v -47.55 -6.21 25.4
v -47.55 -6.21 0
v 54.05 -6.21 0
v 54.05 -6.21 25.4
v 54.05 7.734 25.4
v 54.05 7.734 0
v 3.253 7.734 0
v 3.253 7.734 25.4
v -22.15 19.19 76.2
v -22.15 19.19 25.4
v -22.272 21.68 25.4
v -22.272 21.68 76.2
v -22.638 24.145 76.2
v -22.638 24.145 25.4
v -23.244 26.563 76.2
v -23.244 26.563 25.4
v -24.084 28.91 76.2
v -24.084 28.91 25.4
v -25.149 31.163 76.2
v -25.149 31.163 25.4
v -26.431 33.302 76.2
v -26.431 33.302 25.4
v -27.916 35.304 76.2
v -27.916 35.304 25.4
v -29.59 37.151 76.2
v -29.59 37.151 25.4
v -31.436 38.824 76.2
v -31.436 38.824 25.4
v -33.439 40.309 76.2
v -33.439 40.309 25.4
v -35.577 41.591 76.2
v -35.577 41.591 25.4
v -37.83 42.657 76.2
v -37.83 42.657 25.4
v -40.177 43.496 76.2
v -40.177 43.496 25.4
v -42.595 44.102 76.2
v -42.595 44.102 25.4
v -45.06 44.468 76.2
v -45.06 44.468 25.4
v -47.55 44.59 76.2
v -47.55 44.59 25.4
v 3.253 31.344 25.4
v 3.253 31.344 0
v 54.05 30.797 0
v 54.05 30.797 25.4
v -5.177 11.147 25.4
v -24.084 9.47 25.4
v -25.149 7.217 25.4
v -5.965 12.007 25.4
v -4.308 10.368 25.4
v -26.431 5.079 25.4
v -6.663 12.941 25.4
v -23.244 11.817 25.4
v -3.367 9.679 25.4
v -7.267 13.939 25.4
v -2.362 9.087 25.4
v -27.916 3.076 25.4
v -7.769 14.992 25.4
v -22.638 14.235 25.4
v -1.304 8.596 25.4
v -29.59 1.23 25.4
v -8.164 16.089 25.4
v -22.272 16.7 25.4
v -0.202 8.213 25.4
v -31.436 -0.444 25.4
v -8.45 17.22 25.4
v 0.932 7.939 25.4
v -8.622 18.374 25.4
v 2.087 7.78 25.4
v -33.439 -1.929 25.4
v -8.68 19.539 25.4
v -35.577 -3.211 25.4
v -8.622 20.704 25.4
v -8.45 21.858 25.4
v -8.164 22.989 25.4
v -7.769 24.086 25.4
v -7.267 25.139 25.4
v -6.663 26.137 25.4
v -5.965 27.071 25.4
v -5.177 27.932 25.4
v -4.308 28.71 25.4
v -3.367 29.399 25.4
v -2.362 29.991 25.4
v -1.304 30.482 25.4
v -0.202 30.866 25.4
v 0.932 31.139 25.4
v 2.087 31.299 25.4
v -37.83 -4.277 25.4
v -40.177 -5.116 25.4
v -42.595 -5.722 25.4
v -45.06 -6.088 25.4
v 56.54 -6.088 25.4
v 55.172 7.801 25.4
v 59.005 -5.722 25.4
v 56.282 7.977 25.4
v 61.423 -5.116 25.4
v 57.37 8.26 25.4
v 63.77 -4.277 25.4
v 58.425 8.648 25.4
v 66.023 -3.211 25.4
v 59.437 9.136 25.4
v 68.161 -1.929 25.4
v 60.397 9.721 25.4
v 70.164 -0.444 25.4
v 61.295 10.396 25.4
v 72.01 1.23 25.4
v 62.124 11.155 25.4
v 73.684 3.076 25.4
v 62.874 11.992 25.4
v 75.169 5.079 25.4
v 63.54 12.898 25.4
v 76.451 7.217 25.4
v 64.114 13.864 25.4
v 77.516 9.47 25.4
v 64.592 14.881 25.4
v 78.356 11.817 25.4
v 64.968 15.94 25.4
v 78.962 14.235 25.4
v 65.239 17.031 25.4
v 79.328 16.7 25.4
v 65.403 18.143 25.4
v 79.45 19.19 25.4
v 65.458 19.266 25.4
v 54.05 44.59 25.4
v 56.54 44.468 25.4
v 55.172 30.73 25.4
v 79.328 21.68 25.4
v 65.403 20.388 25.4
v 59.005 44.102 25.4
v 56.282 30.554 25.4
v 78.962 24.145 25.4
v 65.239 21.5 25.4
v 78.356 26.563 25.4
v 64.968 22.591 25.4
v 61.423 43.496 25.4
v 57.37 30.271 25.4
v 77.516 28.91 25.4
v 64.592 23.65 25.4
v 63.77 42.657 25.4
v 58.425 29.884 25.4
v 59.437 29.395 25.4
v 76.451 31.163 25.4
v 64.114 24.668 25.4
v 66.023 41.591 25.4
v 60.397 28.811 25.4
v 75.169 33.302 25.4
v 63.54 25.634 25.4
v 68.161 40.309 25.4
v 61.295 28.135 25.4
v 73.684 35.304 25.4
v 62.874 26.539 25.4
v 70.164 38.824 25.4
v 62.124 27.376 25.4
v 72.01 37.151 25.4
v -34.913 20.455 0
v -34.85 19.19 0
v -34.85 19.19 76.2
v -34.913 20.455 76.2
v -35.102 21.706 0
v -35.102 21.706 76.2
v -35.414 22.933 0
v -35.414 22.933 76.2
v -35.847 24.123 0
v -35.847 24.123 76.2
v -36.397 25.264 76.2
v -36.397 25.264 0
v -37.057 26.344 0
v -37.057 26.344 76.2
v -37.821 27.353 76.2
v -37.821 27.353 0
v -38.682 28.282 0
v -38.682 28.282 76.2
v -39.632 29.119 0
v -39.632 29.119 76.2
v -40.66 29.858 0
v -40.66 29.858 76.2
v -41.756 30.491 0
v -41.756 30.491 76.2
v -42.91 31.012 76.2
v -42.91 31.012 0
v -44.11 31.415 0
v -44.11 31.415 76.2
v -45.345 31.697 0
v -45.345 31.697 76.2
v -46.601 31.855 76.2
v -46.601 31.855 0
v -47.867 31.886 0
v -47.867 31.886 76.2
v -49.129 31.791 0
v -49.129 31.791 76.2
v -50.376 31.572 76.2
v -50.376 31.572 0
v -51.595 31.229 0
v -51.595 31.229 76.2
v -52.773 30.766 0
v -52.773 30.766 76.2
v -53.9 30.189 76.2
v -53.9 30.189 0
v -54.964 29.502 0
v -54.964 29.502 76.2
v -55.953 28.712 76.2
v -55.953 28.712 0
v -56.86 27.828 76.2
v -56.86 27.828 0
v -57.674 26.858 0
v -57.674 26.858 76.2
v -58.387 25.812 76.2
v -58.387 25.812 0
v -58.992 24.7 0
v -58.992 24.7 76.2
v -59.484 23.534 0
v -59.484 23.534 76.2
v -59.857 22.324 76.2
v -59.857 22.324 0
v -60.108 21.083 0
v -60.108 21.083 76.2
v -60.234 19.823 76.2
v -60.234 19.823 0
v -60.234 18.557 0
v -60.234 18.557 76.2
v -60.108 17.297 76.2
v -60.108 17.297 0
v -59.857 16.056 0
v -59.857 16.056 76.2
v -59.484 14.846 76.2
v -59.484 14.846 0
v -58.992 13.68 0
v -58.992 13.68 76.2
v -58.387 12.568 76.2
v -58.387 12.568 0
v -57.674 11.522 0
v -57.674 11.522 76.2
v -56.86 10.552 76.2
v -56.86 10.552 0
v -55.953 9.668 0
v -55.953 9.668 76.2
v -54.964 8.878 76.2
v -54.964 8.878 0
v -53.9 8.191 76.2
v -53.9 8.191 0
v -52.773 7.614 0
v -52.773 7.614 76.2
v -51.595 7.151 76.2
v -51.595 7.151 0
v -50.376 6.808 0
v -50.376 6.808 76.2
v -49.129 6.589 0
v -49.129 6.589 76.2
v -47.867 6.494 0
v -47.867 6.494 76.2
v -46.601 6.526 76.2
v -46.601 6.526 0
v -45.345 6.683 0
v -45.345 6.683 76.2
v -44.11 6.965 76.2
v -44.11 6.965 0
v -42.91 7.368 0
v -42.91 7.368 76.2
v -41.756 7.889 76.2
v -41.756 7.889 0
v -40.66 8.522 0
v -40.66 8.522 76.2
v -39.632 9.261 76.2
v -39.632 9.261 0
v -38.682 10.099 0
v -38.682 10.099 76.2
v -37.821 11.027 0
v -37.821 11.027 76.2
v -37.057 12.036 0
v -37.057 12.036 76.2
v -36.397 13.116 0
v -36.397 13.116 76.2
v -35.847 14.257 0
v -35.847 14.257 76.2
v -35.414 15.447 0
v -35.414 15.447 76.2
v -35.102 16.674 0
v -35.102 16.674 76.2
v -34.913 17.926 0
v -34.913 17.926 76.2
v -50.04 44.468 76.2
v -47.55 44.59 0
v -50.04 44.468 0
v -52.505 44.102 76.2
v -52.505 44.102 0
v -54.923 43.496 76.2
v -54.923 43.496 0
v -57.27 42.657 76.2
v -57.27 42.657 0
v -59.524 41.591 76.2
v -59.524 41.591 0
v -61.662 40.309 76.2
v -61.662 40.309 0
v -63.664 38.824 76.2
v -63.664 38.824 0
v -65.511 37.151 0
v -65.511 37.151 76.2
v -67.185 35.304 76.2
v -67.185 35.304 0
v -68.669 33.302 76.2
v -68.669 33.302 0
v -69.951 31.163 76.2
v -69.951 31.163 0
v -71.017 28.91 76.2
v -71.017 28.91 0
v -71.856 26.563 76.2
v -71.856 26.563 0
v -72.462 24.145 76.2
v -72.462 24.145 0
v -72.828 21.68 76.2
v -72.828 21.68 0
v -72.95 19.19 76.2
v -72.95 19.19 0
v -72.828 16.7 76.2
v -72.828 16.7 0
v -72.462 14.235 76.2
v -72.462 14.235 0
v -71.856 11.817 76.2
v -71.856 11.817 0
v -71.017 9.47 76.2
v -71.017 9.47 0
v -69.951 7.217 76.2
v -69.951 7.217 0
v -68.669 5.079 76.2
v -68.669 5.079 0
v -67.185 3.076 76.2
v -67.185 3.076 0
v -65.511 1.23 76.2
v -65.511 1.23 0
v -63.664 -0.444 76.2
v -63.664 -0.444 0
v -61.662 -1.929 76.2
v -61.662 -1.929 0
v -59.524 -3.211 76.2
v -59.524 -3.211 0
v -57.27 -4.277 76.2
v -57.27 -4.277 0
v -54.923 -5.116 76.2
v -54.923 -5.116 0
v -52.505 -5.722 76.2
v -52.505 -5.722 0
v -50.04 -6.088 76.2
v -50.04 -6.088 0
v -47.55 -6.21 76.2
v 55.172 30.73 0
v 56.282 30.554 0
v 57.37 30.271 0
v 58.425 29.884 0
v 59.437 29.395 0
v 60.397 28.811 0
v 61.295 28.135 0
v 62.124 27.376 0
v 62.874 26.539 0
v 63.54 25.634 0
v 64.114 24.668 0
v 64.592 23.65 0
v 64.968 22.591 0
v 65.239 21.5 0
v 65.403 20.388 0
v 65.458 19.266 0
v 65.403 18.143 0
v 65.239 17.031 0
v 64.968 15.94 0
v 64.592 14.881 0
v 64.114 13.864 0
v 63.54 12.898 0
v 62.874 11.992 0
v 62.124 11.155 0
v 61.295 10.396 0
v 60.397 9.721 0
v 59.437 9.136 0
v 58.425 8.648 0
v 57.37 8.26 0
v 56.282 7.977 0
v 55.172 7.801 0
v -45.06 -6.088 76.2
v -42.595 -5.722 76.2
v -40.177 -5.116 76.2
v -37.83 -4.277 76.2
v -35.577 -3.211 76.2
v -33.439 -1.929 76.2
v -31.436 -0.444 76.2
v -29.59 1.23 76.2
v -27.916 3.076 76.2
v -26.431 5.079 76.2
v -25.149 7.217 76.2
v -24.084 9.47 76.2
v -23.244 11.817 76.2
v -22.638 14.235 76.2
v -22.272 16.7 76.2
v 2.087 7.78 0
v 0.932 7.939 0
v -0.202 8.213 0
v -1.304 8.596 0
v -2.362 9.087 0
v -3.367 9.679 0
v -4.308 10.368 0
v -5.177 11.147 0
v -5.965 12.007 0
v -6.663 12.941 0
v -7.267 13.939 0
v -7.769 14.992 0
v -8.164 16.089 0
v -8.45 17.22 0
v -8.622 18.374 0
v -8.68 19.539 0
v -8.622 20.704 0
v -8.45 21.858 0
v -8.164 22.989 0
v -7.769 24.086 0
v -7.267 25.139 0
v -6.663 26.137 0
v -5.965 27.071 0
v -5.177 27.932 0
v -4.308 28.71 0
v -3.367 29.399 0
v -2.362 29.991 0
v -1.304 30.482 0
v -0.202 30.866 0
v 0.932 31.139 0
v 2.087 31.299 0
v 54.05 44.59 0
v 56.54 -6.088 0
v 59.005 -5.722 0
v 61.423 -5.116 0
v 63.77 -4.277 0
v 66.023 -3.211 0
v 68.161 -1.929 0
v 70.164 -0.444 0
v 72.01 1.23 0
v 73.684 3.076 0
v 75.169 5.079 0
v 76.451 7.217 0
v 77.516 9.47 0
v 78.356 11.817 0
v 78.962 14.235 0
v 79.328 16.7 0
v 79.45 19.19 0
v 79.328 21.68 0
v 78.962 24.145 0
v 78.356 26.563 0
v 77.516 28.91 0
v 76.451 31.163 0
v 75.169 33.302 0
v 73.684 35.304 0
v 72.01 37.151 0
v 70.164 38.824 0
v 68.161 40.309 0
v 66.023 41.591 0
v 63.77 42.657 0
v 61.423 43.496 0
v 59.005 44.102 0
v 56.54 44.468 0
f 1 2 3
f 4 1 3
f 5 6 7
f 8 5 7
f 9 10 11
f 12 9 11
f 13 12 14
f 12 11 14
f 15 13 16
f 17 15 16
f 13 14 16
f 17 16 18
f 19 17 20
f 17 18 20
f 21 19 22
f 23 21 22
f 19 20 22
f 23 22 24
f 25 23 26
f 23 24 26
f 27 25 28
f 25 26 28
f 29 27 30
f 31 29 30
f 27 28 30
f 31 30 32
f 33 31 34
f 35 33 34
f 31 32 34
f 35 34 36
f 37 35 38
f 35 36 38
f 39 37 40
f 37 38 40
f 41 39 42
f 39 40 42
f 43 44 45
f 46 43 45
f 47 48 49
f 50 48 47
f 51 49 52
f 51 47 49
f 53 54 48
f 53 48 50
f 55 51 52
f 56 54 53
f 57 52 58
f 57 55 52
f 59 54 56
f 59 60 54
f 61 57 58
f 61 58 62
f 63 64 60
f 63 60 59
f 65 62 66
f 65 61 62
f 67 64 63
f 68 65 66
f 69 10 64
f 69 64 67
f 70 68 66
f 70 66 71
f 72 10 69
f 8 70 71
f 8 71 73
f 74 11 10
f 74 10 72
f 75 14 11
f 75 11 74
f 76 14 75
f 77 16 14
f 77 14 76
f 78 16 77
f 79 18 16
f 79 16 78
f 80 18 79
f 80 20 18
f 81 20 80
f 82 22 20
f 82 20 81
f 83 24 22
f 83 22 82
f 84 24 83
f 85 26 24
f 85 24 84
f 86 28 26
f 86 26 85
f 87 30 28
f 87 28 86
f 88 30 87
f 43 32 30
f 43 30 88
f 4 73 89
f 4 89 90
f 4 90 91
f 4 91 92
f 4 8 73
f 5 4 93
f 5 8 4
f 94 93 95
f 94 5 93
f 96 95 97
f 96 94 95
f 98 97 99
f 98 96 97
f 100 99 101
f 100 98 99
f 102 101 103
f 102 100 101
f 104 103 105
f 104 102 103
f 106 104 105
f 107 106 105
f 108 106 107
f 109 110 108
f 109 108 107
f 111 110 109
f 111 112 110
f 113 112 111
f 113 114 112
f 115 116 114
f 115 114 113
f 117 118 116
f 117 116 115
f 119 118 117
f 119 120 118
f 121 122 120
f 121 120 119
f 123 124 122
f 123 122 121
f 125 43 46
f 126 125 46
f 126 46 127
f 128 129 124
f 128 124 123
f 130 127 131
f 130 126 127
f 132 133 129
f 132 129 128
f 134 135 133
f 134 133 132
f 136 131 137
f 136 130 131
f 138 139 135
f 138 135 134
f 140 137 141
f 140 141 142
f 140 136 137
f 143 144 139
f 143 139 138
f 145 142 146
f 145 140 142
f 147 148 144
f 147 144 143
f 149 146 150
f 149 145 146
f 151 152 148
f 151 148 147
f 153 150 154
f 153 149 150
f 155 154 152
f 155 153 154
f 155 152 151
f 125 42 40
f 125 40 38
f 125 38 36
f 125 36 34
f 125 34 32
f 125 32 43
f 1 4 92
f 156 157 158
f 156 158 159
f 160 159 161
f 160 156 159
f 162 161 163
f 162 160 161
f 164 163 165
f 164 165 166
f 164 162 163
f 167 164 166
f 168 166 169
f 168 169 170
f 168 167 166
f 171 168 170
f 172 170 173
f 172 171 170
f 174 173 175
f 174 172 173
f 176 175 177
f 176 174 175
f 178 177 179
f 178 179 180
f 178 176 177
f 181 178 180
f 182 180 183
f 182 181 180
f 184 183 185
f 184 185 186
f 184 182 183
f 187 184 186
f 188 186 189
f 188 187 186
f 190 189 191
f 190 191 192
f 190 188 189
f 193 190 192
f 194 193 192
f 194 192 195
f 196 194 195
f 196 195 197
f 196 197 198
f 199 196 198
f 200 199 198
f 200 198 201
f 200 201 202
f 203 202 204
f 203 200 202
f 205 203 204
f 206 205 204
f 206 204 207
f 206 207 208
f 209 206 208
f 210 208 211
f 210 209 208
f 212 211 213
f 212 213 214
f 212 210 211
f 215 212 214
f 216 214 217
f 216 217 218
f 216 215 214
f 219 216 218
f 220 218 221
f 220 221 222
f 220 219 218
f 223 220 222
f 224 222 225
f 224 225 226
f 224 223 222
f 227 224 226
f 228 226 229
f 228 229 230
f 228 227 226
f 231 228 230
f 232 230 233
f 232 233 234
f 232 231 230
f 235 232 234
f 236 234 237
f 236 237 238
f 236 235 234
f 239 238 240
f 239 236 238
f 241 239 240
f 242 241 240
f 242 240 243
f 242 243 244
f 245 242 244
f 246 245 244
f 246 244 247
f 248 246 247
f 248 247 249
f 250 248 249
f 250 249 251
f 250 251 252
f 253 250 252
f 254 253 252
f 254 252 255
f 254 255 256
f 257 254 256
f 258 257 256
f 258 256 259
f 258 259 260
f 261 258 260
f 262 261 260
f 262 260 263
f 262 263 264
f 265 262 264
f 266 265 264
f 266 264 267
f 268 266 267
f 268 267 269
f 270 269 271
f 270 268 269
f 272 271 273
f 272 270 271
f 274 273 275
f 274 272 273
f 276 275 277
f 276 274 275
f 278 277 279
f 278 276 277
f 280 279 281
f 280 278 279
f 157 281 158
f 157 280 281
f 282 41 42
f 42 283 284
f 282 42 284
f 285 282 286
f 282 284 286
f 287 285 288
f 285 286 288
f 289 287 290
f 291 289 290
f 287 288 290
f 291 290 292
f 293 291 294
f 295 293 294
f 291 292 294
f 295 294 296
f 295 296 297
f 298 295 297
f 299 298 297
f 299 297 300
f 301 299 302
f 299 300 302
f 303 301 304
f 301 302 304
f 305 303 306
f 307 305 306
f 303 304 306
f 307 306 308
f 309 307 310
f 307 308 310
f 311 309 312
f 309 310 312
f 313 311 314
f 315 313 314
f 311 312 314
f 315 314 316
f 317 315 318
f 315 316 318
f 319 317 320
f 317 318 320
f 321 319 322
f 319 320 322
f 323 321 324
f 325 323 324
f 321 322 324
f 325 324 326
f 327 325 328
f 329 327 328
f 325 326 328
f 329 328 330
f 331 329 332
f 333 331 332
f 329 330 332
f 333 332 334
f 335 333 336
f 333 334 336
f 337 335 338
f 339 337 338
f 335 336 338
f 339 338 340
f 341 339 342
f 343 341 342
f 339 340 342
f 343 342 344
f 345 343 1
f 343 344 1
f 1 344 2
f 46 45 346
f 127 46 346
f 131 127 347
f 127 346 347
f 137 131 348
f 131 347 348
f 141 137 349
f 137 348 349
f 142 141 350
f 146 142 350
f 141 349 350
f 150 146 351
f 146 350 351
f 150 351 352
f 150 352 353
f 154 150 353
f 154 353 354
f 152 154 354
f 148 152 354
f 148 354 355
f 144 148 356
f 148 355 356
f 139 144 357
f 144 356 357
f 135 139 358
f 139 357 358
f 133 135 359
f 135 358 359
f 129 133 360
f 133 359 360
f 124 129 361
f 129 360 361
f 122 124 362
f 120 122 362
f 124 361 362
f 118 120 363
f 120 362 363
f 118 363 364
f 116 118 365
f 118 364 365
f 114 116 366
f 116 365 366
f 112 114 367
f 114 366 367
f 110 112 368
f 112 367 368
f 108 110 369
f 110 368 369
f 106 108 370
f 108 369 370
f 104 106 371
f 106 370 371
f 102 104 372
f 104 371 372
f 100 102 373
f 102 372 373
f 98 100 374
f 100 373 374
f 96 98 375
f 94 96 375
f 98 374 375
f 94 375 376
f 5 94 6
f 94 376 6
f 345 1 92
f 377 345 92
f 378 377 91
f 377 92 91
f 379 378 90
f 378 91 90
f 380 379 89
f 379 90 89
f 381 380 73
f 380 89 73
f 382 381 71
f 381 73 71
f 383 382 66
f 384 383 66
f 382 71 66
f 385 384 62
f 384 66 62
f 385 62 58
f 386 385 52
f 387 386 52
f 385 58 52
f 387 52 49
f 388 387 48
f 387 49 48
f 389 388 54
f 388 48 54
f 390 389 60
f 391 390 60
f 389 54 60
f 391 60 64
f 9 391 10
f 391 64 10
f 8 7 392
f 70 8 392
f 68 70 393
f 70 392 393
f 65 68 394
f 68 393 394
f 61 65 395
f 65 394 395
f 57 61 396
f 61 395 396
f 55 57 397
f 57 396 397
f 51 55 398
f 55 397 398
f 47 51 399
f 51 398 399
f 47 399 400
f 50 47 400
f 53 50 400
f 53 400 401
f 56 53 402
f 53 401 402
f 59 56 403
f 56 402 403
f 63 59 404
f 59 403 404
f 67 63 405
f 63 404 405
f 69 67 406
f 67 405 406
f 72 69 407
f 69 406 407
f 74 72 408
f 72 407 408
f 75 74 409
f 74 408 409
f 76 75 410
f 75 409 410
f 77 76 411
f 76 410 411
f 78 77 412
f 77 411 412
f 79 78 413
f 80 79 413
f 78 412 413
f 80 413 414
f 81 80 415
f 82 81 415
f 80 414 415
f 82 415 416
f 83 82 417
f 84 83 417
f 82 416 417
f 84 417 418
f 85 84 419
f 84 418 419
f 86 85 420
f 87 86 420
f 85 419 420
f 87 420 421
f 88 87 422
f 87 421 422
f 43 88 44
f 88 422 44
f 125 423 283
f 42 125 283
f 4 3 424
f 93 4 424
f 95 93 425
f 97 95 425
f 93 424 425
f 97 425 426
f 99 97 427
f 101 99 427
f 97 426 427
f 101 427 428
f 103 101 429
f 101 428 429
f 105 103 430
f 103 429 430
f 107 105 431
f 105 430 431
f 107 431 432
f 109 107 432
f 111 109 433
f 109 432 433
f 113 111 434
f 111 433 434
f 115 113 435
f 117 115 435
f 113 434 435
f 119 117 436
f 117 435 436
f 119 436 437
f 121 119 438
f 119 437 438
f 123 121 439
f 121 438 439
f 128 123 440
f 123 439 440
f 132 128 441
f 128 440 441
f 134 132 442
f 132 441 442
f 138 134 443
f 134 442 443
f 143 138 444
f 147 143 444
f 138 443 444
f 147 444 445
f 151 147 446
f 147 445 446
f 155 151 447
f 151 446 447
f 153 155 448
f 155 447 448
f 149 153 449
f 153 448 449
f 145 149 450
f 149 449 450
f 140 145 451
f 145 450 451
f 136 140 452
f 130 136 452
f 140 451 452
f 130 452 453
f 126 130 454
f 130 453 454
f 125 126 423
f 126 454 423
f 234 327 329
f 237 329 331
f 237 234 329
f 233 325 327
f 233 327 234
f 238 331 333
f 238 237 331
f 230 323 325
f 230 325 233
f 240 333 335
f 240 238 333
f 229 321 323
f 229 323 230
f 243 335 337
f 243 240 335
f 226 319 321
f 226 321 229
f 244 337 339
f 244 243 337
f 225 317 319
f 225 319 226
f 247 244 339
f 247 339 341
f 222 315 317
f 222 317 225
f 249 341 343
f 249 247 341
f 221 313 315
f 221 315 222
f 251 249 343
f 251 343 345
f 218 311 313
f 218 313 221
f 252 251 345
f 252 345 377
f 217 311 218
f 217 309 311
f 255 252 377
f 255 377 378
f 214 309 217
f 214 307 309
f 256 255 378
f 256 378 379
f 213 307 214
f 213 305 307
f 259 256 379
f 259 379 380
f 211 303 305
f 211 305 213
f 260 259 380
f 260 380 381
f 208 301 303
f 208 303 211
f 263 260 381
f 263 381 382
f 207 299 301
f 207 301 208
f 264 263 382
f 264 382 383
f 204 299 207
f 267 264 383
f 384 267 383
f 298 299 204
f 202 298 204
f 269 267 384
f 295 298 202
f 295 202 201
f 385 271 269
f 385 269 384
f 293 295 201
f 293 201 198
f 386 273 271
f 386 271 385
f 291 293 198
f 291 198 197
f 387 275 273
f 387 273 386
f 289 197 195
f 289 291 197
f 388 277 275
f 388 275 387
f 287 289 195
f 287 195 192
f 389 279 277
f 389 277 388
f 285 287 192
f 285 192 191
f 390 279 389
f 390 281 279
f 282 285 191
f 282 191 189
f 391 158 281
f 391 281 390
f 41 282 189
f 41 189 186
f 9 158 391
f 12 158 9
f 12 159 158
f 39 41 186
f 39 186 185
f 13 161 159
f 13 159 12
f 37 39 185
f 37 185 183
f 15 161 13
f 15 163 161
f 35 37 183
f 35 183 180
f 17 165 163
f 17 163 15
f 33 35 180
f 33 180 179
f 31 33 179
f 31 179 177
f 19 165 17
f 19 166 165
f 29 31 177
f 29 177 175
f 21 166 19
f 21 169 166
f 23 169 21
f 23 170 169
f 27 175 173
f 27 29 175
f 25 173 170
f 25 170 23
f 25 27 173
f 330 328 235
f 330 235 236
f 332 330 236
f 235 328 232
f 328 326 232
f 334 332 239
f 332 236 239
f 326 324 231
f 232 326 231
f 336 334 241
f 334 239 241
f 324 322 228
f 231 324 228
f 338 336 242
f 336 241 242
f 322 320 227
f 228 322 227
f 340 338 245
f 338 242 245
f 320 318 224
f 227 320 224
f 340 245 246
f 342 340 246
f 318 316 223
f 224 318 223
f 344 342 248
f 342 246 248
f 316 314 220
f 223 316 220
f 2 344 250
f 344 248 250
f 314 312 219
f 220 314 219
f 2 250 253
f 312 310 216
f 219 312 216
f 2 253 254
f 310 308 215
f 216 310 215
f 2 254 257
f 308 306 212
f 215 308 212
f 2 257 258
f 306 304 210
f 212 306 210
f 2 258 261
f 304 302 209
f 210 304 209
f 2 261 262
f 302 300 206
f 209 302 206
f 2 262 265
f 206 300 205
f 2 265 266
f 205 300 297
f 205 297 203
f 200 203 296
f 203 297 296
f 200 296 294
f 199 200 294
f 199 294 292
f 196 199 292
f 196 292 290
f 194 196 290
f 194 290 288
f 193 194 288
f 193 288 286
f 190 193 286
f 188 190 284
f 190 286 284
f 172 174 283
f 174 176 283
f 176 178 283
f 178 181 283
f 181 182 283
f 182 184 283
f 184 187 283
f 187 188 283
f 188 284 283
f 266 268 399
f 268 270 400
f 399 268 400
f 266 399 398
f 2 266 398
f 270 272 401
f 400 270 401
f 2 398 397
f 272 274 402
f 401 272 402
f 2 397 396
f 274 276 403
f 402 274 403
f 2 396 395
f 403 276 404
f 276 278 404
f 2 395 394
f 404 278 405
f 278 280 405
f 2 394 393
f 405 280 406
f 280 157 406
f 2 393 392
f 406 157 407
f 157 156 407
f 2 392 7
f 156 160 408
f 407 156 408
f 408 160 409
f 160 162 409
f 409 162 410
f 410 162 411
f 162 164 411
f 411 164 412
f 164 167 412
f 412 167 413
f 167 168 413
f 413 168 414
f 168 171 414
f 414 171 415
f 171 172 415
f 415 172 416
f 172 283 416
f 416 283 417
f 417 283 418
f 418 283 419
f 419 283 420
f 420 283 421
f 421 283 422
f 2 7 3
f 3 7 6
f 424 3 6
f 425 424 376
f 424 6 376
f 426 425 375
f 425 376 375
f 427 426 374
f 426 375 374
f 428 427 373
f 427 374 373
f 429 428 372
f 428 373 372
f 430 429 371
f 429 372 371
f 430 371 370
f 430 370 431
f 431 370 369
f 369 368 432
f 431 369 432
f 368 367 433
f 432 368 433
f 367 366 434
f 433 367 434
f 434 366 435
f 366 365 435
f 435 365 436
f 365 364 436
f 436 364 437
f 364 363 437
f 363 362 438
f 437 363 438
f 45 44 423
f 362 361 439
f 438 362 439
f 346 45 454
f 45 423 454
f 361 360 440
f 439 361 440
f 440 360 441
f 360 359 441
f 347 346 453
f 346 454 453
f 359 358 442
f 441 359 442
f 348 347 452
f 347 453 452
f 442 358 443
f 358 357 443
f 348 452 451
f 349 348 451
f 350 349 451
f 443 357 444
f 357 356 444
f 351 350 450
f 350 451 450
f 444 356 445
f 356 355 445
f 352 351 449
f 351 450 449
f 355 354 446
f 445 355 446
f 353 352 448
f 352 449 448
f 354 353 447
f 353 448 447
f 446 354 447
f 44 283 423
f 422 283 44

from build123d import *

# Parameters (mm, degrees)
F1_DEPTH = 25.4
F0_R     = 12.7
F2_DEPTH = 76.2


with BuildPart() as f1:
    # F0 (on Top) → F1 (new body)
    with BuildSketch(Plane.XY):
        with BuildLine():
            Line((54.049923, 44.59002), (-47.550077, 44.59002))
            ThreePointArc((-47.550077, 44.59002), (-29.589565, 37.150532), (-22.150077, 19.19002))
            ThreePointArc((-22.150077, 19.19002), (-29.589565, 1.229507), (-47.550077, -6.20998))
            Line((-47.550077, -6.20998), (54.049923, -6.20998))
            ThreePointArc((54.049923, -6.20998), (79.449923, 19.19002), (54.049923, 44.59002))
        make_face()
        with BuildLine():
            Line((3.252867, 31.34379), (54.049923, 30.796887))
            ThreePointArc((54.049923, 30.796887), (65.457669, 19.265659), (54.049923, 7.734431))
            Line((54.049923, 7.734431), (3.252867, 7.734431))
            ThreePointArc((3.252867, 7.734431), (-8.679591, 19.53911), (3.252867, 31.34379))
        make_face(mode=Mode.SUBTRACT)
    extrude(amount=F1_DEPTH)

    # F0 (on Top) → F2 (join)
    with BuildSketch(Plane.XY):
        with BuildLine():
            ThreePointArc((-22.150077, 19.19002), (-29.589565, 37.150532), (-47.550077, 44.59002))
            ThreePointArc((-47.550077, 44.59002), (-72.950077, 19.19002), (-47.550077, -6.20998))
            ThreePointArc((-47.550077, -6.20998), (-29.589565, 1.229507), (-22.150077, 19.19002))
        make_face()
        with Locations((-47.550077, 19.19002)):
            Circle(F0_R, mode=Mode.SUBTRACT)
    extrude(amount=F2_DEPTH)


solid = f1.part
